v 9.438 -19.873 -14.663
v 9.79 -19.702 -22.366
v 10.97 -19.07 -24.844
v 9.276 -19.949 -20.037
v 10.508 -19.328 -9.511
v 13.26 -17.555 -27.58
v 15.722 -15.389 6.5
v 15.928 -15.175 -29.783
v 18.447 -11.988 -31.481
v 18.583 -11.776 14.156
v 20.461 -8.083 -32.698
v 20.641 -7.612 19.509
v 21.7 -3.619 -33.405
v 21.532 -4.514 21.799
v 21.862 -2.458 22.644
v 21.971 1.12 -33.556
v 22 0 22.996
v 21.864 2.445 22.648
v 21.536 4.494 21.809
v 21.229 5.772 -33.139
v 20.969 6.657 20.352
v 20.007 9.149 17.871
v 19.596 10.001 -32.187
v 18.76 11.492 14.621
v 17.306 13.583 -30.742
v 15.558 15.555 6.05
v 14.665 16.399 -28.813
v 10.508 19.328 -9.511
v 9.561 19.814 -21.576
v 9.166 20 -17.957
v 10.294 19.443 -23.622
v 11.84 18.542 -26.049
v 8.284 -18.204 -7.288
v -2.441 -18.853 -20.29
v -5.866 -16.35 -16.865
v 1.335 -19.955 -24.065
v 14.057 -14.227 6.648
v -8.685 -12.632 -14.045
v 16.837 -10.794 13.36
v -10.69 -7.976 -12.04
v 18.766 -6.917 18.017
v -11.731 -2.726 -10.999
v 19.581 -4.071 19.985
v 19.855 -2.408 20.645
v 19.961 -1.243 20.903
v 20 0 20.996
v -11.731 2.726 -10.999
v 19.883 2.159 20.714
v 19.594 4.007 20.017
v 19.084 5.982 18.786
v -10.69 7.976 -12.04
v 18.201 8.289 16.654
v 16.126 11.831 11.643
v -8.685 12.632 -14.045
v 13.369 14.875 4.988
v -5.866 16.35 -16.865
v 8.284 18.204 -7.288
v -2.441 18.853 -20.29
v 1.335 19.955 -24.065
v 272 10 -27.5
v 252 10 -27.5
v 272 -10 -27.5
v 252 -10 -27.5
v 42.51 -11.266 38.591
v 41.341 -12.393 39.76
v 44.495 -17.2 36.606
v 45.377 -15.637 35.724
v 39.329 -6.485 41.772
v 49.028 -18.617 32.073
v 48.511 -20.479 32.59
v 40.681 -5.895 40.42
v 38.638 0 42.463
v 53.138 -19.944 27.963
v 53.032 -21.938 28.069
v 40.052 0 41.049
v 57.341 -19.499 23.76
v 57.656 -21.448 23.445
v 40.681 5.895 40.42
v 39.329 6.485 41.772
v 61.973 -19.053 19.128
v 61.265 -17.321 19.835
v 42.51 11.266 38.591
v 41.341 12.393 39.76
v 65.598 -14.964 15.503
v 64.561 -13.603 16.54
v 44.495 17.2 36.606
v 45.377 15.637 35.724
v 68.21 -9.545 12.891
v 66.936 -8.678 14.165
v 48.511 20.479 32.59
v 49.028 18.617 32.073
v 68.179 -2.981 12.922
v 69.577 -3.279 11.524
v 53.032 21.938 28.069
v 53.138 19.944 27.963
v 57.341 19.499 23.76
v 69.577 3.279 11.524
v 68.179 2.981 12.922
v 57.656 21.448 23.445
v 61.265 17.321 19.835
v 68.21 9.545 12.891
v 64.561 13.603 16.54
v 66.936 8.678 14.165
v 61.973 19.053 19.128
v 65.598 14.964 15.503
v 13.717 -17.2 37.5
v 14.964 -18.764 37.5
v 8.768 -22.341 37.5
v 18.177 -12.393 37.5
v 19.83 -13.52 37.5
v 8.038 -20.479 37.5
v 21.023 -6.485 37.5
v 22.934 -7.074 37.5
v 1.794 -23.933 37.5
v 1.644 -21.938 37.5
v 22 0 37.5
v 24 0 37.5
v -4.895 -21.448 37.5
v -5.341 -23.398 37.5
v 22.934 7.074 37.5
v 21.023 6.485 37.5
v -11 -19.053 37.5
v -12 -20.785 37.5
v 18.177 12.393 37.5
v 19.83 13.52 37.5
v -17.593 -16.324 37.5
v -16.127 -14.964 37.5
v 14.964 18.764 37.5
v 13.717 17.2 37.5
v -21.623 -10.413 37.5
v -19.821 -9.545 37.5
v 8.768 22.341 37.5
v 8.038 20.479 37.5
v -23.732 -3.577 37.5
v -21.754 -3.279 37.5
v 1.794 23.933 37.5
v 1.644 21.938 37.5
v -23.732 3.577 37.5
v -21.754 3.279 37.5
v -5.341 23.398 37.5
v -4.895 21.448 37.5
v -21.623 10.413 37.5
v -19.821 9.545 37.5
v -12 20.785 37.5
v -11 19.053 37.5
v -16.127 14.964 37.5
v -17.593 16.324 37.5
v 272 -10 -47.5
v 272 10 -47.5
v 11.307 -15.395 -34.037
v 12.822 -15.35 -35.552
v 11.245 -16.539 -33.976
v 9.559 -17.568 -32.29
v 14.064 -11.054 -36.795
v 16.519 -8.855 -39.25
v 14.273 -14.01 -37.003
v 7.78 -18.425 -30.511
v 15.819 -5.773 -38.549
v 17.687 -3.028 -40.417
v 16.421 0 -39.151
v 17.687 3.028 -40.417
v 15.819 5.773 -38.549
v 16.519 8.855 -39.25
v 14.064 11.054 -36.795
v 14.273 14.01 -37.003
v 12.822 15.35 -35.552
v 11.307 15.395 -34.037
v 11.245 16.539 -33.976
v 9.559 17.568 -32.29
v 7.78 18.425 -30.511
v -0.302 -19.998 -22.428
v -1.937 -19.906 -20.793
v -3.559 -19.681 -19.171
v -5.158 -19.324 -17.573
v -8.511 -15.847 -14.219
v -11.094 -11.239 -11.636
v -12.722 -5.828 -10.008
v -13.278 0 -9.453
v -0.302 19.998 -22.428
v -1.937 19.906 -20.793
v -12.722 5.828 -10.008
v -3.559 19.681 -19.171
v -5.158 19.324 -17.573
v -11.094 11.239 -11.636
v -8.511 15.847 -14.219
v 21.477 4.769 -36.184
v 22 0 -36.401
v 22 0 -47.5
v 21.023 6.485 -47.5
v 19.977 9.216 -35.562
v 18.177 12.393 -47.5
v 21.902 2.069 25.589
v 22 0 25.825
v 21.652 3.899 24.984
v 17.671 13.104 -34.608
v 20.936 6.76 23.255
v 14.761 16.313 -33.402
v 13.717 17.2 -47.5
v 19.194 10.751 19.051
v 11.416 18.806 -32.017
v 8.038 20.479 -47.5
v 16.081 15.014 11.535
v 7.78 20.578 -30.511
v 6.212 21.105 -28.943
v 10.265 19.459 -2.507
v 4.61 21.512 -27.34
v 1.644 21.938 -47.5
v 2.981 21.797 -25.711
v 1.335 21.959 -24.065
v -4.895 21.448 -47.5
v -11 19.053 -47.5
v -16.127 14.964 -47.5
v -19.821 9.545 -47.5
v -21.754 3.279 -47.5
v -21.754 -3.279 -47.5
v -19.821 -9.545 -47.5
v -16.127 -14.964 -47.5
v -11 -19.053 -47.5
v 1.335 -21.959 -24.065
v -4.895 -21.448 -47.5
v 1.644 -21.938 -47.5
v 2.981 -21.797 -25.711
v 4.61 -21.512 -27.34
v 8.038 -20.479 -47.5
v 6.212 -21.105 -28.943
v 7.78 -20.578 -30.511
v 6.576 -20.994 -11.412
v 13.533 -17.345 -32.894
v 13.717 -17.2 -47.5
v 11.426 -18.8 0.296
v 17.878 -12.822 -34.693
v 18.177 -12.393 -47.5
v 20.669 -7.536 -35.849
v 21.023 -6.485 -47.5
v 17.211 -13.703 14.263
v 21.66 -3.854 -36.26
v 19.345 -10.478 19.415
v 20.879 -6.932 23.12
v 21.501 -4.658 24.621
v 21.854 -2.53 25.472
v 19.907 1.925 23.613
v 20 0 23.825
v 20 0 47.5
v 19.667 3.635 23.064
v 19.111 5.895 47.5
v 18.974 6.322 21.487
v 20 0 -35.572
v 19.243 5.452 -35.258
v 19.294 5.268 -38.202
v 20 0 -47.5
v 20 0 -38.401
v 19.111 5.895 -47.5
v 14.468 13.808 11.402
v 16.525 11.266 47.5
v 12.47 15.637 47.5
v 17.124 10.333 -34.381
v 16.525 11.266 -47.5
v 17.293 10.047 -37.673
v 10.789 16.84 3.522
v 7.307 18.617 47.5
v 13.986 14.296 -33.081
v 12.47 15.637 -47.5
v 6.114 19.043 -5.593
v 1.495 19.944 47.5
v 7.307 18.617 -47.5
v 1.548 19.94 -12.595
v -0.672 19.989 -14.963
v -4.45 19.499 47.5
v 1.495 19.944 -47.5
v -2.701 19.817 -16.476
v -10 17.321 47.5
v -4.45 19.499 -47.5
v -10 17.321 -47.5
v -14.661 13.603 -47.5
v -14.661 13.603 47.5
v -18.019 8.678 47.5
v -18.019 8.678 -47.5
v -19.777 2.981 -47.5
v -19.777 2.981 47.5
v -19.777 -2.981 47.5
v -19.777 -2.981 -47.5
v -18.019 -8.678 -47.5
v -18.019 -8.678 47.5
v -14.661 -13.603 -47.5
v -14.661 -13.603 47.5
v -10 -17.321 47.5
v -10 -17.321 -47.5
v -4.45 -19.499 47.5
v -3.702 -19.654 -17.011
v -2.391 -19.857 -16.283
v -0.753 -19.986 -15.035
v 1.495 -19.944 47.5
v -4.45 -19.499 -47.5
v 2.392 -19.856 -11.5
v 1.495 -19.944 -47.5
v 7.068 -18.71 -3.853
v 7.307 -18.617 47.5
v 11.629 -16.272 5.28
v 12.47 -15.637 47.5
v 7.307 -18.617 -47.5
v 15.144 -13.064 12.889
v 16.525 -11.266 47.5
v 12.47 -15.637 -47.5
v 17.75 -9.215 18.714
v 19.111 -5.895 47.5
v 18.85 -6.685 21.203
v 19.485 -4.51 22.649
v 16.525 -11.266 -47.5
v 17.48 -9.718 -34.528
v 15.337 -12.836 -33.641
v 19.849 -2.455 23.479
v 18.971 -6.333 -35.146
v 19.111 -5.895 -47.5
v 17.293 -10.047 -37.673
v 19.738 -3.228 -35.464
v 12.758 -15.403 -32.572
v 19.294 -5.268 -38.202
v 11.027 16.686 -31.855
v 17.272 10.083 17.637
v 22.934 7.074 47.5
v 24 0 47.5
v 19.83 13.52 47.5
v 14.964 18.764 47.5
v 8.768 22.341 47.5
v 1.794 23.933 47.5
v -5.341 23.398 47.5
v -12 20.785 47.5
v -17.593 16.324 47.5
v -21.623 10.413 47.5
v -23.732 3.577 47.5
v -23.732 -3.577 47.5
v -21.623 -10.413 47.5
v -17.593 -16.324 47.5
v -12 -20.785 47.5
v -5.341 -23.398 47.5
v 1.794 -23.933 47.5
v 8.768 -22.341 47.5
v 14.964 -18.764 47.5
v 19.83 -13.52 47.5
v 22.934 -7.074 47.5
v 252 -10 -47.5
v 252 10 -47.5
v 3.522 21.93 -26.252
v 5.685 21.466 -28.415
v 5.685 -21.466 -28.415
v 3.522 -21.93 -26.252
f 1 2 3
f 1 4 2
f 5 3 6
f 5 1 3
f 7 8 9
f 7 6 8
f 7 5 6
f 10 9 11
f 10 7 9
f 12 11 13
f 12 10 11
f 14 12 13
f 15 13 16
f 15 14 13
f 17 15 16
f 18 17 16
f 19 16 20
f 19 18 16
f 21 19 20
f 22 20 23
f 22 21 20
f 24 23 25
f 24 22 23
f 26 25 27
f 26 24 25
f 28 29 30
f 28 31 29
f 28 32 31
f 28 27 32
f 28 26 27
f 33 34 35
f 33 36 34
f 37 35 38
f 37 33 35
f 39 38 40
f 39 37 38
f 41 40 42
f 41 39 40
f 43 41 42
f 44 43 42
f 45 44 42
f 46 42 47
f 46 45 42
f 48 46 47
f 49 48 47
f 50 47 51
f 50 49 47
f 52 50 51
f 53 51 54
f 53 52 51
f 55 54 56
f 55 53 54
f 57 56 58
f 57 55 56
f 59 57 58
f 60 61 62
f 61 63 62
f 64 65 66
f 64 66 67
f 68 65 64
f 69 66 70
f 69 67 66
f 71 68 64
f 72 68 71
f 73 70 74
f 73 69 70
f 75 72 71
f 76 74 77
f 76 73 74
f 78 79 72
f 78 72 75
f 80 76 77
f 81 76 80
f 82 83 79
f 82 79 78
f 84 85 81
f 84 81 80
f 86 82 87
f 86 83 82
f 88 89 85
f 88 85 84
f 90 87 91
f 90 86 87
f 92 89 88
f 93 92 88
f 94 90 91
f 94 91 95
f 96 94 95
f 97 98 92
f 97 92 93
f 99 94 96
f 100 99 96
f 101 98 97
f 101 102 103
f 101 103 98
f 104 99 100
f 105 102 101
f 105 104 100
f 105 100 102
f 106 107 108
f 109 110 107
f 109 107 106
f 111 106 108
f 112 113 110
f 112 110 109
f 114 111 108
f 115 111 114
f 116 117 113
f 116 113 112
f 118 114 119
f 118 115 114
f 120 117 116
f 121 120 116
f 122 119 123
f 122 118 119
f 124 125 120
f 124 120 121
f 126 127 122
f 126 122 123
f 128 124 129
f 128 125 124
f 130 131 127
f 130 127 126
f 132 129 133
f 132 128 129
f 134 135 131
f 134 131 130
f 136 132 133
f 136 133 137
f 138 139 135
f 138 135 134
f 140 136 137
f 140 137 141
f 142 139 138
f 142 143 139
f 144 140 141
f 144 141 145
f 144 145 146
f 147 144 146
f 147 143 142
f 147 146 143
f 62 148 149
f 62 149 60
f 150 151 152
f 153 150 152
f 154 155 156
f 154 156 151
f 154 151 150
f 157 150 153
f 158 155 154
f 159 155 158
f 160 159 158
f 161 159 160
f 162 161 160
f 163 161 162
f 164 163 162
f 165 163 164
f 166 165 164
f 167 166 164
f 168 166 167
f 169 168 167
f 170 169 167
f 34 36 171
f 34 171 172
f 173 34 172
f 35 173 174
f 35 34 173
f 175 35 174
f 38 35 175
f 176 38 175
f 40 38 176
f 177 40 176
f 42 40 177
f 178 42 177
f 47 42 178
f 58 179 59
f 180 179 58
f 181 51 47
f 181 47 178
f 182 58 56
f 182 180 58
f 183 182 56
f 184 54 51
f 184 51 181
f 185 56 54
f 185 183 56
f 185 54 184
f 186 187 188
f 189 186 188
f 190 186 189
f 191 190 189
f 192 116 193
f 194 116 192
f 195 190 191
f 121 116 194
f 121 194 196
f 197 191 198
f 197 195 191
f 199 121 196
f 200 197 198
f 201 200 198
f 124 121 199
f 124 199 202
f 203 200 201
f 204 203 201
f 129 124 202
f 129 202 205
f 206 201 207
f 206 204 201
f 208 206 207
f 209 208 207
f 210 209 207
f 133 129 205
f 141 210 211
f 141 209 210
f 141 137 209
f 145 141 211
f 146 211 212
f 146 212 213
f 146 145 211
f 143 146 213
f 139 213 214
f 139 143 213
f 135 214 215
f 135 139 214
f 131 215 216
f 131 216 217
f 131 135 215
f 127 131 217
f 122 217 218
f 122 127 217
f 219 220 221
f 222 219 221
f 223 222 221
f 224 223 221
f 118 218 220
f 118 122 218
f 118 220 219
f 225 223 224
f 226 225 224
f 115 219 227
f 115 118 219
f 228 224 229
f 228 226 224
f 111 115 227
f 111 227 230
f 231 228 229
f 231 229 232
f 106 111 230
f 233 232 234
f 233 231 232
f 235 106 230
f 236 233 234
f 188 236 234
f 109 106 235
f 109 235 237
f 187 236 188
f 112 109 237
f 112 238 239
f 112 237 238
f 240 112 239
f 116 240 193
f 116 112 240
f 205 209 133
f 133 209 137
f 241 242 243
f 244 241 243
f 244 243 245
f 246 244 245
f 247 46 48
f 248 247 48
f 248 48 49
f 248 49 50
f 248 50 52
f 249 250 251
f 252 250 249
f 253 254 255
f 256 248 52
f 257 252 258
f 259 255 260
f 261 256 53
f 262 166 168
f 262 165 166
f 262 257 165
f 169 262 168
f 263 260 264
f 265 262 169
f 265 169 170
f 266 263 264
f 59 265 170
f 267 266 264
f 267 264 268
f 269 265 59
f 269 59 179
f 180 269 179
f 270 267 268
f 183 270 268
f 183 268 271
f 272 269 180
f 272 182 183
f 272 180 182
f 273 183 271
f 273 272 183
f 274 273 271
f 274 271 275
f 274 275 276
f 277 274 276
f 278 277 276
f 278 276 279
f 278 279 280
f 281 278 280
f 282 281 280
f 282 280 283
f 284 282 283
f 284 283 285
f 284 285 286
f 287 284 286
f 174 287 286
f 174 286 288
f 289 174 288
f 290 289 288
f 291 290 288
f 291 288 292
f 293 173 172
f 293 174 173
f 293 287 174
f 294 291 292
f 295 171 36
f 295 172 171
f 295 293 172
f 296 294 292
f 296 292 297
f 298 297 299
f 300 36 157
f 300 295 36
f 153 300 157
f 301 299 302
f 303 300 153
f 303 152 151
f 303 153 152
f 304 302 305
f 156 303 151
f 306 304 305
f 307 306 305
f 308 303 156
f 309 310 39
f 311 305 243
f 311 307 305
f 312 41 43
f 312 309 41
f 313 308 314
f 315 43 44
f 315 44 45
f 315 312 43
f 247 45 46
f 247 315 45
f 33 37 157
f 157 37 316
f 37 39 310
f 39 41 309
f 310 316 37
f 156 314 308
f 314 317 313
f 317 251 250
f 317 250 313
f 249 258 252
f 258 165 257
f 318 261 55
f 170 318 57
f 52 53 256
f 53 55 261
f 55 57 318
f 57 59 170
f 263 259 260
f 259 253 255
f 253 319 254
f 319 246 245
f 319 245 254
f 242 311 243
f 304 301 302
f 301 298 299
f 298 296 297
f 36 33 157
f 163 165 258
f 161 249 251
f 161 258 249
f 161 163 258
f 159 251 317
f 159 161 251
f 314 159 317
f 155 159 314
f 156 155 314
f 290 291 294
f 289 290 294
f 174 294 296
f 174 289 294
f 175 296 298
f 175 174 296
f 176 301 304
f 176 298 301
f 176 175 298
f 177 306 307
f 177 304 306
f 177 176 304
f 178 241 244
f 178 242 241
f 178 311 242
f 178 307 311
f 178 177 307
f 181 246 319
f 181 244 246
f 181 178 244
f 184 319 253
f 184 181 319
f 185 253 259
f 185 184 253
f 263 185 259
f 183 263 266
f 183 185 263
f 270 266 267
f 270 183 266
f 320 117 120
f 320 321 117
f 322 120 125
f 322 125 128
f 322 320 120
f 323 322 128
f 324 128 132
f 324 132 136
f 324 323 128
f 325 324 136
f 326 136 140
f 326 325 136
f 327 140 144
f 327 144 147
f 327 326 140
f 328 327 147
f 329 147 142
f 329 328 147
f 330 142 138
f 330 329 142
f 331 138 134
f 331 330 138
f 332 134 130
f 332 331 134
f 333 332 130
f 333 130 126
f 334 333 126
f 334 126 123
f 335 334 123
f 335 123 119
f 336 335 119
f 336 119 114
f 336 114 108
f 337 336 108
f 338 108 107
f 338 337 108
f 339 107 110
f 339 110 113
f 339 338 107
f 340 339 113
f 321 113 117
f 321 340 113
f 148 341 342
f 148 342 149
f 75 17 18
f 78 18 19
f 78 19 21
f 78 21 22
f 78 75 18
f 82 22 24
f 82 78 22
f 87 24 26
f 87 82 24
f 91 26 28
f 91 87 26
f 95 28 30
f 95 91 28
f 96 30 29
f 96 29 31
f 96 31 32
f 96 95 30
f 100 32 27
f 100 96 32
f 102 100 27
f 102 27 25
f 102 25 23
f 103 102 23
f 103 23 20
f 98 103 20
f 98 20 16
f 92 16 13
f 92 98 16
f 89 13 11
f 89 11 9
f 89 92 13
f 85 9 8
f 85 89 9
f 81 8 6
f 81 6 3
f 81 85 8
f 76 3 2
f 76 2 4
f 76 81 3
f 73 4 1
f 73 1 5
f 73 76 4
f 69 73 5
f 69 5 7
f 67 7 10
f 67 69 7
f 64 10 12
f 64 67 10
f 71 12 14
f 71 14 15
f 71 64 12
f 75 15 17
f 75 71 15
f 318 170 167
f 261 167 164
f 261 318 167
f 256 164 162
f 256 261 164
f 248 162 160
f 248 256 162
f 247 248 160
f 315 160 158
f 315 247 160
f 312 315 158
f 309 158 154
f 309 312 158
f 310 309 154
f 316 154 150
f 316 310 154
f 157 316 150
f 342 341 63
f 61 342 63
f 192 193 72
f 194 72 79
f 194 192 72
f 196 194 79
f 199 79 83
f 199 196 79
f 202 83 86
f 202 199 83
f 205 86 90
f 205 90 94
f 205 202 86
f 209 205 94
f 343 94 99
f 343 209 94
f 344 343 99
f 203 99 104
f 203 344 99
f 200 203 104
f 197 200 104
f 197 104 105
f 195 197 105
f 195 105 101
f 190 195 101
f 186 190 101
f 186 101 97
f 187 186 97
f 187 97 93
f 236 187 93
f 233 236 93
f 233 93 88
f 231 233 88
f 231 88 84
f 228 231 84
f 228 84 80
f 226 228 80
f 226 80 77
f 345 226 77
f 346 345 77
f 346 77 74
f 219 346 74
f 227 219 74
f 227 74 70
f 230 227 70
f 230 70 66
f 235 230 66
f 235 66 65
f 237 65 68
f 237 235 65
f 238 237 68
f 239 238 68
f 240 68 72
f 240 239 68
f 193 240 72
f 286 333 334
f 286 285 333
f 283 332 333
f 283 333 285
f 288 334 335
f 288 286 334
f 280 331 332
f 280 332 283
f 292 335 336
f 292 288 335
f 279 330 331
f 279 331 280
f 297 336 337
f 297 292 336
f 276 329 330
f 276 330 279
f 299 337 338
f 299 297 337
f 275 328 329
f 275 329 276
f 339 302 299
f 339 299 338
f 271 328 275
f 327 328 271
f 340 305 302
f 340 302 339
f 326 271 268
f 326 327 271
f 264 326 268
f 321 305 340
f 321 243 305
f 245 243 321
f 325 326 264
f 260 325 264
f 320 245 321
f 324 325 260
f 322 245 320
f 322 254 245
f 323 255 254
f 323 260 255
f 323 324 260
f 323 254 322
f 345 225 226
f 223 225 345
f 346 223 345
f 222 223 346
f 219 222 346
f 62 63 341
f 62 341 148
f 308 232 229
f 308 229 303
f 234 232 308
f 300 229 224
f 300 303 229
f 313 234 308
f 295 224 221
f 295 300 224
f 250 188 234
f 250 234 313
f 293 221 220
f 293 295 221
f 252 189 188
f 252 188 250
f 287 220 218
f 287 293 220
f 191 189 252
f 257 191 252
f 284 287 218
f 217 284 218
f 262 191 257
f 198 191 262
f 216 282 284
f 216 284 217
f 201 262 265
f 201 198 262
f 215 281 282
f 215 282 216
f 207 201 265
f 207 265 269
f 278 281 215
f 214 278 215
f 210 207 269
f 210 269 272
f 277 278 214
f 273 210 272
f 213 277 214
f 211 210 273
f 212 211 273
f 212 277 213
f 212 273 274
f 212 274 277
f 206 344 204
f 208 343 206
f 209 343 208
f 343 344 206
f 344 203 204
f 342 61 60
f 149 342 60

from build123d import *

# Parameters (mm, degrees)
F0_W     = 2
F0_H     = 10
F0_W_2   = 20
F0_H_2   = 20
F3_DEPTH = 10


with BuildPart() as f1:
    # F0 (on Front) → F1 (revolve)
    with BuildSketch(Plane.XZ):
        with Locations((23, 42.5)):
            Rectangle(F0_W, F0_H)
        Polygon((20, 45.5), (20, 23.8248504249), (22, 25.8248504249), (22, 37.5), (22, 47.5), (20, 47.5), align=None)
        Polygon((20, 20.9964233001), (20, -45.5), (20, -47.5), (22, -47.5), (22, 22.9964233001), align=None)
        Polygon((20, 23.8248504249), (20, 20.9964233001), (22, 22.9964233001), (22, 25.8248504249), align=None)
    revolve(axis=Axis((0, 0, -46.5), (0, 0, 1)))

    # F0 (on Front) → F2 (revolve)
    with BuildSketch(Plane.XZ):
        Polygon((22, 25.8248504249), (22, 22.9964233001), (40.0522784804, 41.0487017805), (38.638064918, 42.4629153429), align=None)
        Polygon((0, 0.9964233001), (20, 20.9964233001), (20, 23.8248504249), (0, 3.8248504249), align=None)
        Polygon((-11.8633580263, -10.8669347261), (0, 0.9964233001), (0, 3.8248504249), (-13.2775715886, -9.4527211638), align=None)
        Polygon((20, 23.8248504249), (20, 20.9964233001), (22, 22.9964233001), (22, 25.8248504249), align=None)
    revolve(axis=Axis((27.0972070521, 0, -0.1906408953), (-0.7071067812, 0, -0.7071067812)))


with BuildPart() as f3:
    # F0 (on Front) → F3 (new body, symmetric)
    with BuildSketch(Plane.XZ):
        with Locations((262, -37.5)):
            Rectangle(F0_W_2, F0_H_2)
    extrude(amount=F3_DEPTH, both=True)


with BuildPart() as f3b:
    # F0 (on Front) → F3, piece 2 (new body, symmetric)
    with BuildSketch(Plane.XZ):
        Polygon((22, 25.8248504249), (22, 22.9964233001), (40.0522784804, 41.0487017805), (38.638064918, 42.4629153429), align=None)
        Polygon((0, 0.9964233001), (20, 20.9964233001), (20, 23.8248504249), (0, 3.8248504249), align=None)
        Polygon((-11.8633580263, -10.8669347261), (0, 0.9964233001), (0, 3.8248504249), (-13.2775715886, -9.4527211638), align=None)
        Polygon((20, 23.8248504249), (20, 20.9964233001), (22, 22.9964233001), (22, 25.8248504249), align=None)
        Polygon((20, 20.9964233001), (20, -45.5), (20, -47.5), (22, -47.5), (22, 22.9964233001), align=None)
        Polygon((20, 45.5), (20, 23.8248504249), (22, 25.8248504249), (22, 37.5), (22, 47.5), (20, 47.5), align=None)
        with Locations((23, 42.5)):
            Rectangle(F0_W, F0_H)
    extrude(amount=F3_DEPTH, both=True)


solid = Compound([f1.part, f3.part])
